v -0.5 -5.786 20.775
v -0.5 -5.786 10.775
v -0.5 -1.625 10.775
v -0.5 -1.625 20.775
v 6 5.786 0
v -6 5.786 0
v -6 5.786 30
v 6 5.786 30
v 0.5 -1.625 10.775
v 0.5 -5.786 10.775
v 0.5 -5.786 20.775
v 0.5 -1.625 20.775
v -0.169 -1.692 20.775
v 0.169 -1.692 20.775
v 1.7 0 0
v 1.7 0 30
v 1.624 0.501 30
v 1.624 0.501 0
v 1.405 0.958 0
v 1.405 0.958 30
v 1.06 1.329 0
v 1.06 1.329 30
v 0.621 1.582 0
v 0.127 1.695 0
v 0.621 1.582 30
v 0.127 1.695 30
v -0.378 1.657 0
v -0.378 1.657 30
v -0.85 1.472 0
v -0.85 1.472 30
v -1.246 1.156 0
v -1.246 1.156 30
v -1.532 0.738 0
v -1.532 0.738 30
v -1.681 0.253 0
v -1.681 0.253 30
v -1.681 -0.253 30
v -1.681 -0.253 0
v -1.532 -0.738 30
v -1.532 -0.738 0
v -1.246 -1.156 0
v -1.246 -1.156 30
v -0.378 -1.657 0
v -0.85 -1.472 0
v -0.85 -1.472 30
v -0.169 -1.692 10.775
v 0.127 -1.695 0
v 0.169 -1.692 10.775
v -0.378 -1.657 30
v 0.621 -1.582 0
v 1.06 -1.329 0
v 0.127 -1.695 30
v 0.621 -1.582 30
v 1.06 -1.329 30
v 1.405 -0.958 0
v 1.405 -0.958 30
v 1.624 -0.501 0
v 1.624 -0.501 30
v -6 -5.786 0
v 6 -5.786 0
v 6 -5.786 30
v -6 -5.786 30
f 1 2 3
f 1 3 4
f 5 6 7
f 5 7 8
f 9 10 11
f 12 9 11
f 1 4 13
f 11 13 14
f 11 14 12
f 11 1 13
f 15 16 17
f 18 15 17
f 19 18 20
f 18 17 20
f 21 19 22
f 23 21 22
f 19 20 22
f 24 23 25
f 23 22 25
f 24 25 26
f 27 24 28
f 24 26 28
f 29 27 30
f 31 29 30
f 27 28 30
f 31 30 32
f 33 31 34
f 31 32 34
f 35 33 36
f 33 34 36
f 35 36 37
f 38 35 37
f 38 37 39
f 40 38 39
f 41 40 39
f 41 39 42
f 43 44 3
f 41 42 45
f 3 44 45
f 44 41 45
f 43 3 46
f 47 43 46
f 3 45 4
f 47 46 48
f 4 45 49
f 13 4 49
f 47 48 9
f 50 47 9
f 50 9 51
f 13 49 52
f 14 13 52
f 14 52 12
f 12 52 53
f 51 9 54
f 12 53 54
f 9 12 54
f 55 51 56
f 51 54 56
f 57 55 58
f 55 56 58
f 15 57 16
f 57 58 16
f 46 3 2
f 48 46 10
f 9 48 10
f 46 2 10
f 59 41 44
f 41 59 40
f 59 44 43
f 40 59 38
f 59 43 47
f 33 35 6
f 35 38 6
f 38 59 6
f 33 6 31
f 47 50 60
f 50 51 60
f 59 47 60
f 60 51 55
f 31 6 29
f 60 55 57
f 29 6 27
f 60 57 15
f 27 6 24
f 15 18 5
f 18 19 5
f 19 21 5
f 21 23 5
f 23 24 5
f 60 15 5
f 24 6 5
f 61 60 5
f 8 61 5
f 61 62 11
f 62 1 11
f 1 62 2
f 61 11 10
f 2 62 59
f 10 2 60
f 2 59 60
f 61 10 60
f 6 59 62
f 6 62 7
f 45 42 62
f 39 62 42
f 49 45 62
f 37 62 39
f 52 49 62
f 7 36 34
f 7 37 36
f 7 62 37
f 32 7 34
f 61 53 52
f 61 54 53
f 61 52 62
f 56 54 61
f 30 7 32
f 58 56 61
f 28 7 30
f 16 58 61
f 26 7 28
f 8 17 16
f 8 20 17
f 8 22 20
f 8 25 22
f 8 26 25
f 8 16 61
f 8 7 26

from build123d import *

# Parameters (mm, degrees)
F0_W     = 12
F0_H     = 11.57143
F1_DEPTH = 30
F2_R     = 1.7
F3_DEPTH = 30
F4_W     = 1
F4_H     = 10
F5_DEPTH = 6


with BuildPart() as f1:
    # F0 (on Top) → F1 (new body)
    with BuildSketch(Plane.XY):
        Rectangle(F0_W, F0_H)
    extrude(amount=F1_DEPTH)

    # F2 (on face) → F3 (cut)
    with BuildSketch(Plane.XY.offset(30)):
        Circle(F2_R)
    extrude(amount=-F3_DEPTH, mode=Mode.SUBTRACT)

    # F4 (on face) → F5 (cut)
    with BuildSketch(Plane.XZ.offset(5.785715)):
        with Locations((0, 15.774963)):
            Rectangle(F4_W, F4_H)
    extrude(amount=-F5_DEPTH, mode=Mode.SUBTRACT)


solid = f1.part
